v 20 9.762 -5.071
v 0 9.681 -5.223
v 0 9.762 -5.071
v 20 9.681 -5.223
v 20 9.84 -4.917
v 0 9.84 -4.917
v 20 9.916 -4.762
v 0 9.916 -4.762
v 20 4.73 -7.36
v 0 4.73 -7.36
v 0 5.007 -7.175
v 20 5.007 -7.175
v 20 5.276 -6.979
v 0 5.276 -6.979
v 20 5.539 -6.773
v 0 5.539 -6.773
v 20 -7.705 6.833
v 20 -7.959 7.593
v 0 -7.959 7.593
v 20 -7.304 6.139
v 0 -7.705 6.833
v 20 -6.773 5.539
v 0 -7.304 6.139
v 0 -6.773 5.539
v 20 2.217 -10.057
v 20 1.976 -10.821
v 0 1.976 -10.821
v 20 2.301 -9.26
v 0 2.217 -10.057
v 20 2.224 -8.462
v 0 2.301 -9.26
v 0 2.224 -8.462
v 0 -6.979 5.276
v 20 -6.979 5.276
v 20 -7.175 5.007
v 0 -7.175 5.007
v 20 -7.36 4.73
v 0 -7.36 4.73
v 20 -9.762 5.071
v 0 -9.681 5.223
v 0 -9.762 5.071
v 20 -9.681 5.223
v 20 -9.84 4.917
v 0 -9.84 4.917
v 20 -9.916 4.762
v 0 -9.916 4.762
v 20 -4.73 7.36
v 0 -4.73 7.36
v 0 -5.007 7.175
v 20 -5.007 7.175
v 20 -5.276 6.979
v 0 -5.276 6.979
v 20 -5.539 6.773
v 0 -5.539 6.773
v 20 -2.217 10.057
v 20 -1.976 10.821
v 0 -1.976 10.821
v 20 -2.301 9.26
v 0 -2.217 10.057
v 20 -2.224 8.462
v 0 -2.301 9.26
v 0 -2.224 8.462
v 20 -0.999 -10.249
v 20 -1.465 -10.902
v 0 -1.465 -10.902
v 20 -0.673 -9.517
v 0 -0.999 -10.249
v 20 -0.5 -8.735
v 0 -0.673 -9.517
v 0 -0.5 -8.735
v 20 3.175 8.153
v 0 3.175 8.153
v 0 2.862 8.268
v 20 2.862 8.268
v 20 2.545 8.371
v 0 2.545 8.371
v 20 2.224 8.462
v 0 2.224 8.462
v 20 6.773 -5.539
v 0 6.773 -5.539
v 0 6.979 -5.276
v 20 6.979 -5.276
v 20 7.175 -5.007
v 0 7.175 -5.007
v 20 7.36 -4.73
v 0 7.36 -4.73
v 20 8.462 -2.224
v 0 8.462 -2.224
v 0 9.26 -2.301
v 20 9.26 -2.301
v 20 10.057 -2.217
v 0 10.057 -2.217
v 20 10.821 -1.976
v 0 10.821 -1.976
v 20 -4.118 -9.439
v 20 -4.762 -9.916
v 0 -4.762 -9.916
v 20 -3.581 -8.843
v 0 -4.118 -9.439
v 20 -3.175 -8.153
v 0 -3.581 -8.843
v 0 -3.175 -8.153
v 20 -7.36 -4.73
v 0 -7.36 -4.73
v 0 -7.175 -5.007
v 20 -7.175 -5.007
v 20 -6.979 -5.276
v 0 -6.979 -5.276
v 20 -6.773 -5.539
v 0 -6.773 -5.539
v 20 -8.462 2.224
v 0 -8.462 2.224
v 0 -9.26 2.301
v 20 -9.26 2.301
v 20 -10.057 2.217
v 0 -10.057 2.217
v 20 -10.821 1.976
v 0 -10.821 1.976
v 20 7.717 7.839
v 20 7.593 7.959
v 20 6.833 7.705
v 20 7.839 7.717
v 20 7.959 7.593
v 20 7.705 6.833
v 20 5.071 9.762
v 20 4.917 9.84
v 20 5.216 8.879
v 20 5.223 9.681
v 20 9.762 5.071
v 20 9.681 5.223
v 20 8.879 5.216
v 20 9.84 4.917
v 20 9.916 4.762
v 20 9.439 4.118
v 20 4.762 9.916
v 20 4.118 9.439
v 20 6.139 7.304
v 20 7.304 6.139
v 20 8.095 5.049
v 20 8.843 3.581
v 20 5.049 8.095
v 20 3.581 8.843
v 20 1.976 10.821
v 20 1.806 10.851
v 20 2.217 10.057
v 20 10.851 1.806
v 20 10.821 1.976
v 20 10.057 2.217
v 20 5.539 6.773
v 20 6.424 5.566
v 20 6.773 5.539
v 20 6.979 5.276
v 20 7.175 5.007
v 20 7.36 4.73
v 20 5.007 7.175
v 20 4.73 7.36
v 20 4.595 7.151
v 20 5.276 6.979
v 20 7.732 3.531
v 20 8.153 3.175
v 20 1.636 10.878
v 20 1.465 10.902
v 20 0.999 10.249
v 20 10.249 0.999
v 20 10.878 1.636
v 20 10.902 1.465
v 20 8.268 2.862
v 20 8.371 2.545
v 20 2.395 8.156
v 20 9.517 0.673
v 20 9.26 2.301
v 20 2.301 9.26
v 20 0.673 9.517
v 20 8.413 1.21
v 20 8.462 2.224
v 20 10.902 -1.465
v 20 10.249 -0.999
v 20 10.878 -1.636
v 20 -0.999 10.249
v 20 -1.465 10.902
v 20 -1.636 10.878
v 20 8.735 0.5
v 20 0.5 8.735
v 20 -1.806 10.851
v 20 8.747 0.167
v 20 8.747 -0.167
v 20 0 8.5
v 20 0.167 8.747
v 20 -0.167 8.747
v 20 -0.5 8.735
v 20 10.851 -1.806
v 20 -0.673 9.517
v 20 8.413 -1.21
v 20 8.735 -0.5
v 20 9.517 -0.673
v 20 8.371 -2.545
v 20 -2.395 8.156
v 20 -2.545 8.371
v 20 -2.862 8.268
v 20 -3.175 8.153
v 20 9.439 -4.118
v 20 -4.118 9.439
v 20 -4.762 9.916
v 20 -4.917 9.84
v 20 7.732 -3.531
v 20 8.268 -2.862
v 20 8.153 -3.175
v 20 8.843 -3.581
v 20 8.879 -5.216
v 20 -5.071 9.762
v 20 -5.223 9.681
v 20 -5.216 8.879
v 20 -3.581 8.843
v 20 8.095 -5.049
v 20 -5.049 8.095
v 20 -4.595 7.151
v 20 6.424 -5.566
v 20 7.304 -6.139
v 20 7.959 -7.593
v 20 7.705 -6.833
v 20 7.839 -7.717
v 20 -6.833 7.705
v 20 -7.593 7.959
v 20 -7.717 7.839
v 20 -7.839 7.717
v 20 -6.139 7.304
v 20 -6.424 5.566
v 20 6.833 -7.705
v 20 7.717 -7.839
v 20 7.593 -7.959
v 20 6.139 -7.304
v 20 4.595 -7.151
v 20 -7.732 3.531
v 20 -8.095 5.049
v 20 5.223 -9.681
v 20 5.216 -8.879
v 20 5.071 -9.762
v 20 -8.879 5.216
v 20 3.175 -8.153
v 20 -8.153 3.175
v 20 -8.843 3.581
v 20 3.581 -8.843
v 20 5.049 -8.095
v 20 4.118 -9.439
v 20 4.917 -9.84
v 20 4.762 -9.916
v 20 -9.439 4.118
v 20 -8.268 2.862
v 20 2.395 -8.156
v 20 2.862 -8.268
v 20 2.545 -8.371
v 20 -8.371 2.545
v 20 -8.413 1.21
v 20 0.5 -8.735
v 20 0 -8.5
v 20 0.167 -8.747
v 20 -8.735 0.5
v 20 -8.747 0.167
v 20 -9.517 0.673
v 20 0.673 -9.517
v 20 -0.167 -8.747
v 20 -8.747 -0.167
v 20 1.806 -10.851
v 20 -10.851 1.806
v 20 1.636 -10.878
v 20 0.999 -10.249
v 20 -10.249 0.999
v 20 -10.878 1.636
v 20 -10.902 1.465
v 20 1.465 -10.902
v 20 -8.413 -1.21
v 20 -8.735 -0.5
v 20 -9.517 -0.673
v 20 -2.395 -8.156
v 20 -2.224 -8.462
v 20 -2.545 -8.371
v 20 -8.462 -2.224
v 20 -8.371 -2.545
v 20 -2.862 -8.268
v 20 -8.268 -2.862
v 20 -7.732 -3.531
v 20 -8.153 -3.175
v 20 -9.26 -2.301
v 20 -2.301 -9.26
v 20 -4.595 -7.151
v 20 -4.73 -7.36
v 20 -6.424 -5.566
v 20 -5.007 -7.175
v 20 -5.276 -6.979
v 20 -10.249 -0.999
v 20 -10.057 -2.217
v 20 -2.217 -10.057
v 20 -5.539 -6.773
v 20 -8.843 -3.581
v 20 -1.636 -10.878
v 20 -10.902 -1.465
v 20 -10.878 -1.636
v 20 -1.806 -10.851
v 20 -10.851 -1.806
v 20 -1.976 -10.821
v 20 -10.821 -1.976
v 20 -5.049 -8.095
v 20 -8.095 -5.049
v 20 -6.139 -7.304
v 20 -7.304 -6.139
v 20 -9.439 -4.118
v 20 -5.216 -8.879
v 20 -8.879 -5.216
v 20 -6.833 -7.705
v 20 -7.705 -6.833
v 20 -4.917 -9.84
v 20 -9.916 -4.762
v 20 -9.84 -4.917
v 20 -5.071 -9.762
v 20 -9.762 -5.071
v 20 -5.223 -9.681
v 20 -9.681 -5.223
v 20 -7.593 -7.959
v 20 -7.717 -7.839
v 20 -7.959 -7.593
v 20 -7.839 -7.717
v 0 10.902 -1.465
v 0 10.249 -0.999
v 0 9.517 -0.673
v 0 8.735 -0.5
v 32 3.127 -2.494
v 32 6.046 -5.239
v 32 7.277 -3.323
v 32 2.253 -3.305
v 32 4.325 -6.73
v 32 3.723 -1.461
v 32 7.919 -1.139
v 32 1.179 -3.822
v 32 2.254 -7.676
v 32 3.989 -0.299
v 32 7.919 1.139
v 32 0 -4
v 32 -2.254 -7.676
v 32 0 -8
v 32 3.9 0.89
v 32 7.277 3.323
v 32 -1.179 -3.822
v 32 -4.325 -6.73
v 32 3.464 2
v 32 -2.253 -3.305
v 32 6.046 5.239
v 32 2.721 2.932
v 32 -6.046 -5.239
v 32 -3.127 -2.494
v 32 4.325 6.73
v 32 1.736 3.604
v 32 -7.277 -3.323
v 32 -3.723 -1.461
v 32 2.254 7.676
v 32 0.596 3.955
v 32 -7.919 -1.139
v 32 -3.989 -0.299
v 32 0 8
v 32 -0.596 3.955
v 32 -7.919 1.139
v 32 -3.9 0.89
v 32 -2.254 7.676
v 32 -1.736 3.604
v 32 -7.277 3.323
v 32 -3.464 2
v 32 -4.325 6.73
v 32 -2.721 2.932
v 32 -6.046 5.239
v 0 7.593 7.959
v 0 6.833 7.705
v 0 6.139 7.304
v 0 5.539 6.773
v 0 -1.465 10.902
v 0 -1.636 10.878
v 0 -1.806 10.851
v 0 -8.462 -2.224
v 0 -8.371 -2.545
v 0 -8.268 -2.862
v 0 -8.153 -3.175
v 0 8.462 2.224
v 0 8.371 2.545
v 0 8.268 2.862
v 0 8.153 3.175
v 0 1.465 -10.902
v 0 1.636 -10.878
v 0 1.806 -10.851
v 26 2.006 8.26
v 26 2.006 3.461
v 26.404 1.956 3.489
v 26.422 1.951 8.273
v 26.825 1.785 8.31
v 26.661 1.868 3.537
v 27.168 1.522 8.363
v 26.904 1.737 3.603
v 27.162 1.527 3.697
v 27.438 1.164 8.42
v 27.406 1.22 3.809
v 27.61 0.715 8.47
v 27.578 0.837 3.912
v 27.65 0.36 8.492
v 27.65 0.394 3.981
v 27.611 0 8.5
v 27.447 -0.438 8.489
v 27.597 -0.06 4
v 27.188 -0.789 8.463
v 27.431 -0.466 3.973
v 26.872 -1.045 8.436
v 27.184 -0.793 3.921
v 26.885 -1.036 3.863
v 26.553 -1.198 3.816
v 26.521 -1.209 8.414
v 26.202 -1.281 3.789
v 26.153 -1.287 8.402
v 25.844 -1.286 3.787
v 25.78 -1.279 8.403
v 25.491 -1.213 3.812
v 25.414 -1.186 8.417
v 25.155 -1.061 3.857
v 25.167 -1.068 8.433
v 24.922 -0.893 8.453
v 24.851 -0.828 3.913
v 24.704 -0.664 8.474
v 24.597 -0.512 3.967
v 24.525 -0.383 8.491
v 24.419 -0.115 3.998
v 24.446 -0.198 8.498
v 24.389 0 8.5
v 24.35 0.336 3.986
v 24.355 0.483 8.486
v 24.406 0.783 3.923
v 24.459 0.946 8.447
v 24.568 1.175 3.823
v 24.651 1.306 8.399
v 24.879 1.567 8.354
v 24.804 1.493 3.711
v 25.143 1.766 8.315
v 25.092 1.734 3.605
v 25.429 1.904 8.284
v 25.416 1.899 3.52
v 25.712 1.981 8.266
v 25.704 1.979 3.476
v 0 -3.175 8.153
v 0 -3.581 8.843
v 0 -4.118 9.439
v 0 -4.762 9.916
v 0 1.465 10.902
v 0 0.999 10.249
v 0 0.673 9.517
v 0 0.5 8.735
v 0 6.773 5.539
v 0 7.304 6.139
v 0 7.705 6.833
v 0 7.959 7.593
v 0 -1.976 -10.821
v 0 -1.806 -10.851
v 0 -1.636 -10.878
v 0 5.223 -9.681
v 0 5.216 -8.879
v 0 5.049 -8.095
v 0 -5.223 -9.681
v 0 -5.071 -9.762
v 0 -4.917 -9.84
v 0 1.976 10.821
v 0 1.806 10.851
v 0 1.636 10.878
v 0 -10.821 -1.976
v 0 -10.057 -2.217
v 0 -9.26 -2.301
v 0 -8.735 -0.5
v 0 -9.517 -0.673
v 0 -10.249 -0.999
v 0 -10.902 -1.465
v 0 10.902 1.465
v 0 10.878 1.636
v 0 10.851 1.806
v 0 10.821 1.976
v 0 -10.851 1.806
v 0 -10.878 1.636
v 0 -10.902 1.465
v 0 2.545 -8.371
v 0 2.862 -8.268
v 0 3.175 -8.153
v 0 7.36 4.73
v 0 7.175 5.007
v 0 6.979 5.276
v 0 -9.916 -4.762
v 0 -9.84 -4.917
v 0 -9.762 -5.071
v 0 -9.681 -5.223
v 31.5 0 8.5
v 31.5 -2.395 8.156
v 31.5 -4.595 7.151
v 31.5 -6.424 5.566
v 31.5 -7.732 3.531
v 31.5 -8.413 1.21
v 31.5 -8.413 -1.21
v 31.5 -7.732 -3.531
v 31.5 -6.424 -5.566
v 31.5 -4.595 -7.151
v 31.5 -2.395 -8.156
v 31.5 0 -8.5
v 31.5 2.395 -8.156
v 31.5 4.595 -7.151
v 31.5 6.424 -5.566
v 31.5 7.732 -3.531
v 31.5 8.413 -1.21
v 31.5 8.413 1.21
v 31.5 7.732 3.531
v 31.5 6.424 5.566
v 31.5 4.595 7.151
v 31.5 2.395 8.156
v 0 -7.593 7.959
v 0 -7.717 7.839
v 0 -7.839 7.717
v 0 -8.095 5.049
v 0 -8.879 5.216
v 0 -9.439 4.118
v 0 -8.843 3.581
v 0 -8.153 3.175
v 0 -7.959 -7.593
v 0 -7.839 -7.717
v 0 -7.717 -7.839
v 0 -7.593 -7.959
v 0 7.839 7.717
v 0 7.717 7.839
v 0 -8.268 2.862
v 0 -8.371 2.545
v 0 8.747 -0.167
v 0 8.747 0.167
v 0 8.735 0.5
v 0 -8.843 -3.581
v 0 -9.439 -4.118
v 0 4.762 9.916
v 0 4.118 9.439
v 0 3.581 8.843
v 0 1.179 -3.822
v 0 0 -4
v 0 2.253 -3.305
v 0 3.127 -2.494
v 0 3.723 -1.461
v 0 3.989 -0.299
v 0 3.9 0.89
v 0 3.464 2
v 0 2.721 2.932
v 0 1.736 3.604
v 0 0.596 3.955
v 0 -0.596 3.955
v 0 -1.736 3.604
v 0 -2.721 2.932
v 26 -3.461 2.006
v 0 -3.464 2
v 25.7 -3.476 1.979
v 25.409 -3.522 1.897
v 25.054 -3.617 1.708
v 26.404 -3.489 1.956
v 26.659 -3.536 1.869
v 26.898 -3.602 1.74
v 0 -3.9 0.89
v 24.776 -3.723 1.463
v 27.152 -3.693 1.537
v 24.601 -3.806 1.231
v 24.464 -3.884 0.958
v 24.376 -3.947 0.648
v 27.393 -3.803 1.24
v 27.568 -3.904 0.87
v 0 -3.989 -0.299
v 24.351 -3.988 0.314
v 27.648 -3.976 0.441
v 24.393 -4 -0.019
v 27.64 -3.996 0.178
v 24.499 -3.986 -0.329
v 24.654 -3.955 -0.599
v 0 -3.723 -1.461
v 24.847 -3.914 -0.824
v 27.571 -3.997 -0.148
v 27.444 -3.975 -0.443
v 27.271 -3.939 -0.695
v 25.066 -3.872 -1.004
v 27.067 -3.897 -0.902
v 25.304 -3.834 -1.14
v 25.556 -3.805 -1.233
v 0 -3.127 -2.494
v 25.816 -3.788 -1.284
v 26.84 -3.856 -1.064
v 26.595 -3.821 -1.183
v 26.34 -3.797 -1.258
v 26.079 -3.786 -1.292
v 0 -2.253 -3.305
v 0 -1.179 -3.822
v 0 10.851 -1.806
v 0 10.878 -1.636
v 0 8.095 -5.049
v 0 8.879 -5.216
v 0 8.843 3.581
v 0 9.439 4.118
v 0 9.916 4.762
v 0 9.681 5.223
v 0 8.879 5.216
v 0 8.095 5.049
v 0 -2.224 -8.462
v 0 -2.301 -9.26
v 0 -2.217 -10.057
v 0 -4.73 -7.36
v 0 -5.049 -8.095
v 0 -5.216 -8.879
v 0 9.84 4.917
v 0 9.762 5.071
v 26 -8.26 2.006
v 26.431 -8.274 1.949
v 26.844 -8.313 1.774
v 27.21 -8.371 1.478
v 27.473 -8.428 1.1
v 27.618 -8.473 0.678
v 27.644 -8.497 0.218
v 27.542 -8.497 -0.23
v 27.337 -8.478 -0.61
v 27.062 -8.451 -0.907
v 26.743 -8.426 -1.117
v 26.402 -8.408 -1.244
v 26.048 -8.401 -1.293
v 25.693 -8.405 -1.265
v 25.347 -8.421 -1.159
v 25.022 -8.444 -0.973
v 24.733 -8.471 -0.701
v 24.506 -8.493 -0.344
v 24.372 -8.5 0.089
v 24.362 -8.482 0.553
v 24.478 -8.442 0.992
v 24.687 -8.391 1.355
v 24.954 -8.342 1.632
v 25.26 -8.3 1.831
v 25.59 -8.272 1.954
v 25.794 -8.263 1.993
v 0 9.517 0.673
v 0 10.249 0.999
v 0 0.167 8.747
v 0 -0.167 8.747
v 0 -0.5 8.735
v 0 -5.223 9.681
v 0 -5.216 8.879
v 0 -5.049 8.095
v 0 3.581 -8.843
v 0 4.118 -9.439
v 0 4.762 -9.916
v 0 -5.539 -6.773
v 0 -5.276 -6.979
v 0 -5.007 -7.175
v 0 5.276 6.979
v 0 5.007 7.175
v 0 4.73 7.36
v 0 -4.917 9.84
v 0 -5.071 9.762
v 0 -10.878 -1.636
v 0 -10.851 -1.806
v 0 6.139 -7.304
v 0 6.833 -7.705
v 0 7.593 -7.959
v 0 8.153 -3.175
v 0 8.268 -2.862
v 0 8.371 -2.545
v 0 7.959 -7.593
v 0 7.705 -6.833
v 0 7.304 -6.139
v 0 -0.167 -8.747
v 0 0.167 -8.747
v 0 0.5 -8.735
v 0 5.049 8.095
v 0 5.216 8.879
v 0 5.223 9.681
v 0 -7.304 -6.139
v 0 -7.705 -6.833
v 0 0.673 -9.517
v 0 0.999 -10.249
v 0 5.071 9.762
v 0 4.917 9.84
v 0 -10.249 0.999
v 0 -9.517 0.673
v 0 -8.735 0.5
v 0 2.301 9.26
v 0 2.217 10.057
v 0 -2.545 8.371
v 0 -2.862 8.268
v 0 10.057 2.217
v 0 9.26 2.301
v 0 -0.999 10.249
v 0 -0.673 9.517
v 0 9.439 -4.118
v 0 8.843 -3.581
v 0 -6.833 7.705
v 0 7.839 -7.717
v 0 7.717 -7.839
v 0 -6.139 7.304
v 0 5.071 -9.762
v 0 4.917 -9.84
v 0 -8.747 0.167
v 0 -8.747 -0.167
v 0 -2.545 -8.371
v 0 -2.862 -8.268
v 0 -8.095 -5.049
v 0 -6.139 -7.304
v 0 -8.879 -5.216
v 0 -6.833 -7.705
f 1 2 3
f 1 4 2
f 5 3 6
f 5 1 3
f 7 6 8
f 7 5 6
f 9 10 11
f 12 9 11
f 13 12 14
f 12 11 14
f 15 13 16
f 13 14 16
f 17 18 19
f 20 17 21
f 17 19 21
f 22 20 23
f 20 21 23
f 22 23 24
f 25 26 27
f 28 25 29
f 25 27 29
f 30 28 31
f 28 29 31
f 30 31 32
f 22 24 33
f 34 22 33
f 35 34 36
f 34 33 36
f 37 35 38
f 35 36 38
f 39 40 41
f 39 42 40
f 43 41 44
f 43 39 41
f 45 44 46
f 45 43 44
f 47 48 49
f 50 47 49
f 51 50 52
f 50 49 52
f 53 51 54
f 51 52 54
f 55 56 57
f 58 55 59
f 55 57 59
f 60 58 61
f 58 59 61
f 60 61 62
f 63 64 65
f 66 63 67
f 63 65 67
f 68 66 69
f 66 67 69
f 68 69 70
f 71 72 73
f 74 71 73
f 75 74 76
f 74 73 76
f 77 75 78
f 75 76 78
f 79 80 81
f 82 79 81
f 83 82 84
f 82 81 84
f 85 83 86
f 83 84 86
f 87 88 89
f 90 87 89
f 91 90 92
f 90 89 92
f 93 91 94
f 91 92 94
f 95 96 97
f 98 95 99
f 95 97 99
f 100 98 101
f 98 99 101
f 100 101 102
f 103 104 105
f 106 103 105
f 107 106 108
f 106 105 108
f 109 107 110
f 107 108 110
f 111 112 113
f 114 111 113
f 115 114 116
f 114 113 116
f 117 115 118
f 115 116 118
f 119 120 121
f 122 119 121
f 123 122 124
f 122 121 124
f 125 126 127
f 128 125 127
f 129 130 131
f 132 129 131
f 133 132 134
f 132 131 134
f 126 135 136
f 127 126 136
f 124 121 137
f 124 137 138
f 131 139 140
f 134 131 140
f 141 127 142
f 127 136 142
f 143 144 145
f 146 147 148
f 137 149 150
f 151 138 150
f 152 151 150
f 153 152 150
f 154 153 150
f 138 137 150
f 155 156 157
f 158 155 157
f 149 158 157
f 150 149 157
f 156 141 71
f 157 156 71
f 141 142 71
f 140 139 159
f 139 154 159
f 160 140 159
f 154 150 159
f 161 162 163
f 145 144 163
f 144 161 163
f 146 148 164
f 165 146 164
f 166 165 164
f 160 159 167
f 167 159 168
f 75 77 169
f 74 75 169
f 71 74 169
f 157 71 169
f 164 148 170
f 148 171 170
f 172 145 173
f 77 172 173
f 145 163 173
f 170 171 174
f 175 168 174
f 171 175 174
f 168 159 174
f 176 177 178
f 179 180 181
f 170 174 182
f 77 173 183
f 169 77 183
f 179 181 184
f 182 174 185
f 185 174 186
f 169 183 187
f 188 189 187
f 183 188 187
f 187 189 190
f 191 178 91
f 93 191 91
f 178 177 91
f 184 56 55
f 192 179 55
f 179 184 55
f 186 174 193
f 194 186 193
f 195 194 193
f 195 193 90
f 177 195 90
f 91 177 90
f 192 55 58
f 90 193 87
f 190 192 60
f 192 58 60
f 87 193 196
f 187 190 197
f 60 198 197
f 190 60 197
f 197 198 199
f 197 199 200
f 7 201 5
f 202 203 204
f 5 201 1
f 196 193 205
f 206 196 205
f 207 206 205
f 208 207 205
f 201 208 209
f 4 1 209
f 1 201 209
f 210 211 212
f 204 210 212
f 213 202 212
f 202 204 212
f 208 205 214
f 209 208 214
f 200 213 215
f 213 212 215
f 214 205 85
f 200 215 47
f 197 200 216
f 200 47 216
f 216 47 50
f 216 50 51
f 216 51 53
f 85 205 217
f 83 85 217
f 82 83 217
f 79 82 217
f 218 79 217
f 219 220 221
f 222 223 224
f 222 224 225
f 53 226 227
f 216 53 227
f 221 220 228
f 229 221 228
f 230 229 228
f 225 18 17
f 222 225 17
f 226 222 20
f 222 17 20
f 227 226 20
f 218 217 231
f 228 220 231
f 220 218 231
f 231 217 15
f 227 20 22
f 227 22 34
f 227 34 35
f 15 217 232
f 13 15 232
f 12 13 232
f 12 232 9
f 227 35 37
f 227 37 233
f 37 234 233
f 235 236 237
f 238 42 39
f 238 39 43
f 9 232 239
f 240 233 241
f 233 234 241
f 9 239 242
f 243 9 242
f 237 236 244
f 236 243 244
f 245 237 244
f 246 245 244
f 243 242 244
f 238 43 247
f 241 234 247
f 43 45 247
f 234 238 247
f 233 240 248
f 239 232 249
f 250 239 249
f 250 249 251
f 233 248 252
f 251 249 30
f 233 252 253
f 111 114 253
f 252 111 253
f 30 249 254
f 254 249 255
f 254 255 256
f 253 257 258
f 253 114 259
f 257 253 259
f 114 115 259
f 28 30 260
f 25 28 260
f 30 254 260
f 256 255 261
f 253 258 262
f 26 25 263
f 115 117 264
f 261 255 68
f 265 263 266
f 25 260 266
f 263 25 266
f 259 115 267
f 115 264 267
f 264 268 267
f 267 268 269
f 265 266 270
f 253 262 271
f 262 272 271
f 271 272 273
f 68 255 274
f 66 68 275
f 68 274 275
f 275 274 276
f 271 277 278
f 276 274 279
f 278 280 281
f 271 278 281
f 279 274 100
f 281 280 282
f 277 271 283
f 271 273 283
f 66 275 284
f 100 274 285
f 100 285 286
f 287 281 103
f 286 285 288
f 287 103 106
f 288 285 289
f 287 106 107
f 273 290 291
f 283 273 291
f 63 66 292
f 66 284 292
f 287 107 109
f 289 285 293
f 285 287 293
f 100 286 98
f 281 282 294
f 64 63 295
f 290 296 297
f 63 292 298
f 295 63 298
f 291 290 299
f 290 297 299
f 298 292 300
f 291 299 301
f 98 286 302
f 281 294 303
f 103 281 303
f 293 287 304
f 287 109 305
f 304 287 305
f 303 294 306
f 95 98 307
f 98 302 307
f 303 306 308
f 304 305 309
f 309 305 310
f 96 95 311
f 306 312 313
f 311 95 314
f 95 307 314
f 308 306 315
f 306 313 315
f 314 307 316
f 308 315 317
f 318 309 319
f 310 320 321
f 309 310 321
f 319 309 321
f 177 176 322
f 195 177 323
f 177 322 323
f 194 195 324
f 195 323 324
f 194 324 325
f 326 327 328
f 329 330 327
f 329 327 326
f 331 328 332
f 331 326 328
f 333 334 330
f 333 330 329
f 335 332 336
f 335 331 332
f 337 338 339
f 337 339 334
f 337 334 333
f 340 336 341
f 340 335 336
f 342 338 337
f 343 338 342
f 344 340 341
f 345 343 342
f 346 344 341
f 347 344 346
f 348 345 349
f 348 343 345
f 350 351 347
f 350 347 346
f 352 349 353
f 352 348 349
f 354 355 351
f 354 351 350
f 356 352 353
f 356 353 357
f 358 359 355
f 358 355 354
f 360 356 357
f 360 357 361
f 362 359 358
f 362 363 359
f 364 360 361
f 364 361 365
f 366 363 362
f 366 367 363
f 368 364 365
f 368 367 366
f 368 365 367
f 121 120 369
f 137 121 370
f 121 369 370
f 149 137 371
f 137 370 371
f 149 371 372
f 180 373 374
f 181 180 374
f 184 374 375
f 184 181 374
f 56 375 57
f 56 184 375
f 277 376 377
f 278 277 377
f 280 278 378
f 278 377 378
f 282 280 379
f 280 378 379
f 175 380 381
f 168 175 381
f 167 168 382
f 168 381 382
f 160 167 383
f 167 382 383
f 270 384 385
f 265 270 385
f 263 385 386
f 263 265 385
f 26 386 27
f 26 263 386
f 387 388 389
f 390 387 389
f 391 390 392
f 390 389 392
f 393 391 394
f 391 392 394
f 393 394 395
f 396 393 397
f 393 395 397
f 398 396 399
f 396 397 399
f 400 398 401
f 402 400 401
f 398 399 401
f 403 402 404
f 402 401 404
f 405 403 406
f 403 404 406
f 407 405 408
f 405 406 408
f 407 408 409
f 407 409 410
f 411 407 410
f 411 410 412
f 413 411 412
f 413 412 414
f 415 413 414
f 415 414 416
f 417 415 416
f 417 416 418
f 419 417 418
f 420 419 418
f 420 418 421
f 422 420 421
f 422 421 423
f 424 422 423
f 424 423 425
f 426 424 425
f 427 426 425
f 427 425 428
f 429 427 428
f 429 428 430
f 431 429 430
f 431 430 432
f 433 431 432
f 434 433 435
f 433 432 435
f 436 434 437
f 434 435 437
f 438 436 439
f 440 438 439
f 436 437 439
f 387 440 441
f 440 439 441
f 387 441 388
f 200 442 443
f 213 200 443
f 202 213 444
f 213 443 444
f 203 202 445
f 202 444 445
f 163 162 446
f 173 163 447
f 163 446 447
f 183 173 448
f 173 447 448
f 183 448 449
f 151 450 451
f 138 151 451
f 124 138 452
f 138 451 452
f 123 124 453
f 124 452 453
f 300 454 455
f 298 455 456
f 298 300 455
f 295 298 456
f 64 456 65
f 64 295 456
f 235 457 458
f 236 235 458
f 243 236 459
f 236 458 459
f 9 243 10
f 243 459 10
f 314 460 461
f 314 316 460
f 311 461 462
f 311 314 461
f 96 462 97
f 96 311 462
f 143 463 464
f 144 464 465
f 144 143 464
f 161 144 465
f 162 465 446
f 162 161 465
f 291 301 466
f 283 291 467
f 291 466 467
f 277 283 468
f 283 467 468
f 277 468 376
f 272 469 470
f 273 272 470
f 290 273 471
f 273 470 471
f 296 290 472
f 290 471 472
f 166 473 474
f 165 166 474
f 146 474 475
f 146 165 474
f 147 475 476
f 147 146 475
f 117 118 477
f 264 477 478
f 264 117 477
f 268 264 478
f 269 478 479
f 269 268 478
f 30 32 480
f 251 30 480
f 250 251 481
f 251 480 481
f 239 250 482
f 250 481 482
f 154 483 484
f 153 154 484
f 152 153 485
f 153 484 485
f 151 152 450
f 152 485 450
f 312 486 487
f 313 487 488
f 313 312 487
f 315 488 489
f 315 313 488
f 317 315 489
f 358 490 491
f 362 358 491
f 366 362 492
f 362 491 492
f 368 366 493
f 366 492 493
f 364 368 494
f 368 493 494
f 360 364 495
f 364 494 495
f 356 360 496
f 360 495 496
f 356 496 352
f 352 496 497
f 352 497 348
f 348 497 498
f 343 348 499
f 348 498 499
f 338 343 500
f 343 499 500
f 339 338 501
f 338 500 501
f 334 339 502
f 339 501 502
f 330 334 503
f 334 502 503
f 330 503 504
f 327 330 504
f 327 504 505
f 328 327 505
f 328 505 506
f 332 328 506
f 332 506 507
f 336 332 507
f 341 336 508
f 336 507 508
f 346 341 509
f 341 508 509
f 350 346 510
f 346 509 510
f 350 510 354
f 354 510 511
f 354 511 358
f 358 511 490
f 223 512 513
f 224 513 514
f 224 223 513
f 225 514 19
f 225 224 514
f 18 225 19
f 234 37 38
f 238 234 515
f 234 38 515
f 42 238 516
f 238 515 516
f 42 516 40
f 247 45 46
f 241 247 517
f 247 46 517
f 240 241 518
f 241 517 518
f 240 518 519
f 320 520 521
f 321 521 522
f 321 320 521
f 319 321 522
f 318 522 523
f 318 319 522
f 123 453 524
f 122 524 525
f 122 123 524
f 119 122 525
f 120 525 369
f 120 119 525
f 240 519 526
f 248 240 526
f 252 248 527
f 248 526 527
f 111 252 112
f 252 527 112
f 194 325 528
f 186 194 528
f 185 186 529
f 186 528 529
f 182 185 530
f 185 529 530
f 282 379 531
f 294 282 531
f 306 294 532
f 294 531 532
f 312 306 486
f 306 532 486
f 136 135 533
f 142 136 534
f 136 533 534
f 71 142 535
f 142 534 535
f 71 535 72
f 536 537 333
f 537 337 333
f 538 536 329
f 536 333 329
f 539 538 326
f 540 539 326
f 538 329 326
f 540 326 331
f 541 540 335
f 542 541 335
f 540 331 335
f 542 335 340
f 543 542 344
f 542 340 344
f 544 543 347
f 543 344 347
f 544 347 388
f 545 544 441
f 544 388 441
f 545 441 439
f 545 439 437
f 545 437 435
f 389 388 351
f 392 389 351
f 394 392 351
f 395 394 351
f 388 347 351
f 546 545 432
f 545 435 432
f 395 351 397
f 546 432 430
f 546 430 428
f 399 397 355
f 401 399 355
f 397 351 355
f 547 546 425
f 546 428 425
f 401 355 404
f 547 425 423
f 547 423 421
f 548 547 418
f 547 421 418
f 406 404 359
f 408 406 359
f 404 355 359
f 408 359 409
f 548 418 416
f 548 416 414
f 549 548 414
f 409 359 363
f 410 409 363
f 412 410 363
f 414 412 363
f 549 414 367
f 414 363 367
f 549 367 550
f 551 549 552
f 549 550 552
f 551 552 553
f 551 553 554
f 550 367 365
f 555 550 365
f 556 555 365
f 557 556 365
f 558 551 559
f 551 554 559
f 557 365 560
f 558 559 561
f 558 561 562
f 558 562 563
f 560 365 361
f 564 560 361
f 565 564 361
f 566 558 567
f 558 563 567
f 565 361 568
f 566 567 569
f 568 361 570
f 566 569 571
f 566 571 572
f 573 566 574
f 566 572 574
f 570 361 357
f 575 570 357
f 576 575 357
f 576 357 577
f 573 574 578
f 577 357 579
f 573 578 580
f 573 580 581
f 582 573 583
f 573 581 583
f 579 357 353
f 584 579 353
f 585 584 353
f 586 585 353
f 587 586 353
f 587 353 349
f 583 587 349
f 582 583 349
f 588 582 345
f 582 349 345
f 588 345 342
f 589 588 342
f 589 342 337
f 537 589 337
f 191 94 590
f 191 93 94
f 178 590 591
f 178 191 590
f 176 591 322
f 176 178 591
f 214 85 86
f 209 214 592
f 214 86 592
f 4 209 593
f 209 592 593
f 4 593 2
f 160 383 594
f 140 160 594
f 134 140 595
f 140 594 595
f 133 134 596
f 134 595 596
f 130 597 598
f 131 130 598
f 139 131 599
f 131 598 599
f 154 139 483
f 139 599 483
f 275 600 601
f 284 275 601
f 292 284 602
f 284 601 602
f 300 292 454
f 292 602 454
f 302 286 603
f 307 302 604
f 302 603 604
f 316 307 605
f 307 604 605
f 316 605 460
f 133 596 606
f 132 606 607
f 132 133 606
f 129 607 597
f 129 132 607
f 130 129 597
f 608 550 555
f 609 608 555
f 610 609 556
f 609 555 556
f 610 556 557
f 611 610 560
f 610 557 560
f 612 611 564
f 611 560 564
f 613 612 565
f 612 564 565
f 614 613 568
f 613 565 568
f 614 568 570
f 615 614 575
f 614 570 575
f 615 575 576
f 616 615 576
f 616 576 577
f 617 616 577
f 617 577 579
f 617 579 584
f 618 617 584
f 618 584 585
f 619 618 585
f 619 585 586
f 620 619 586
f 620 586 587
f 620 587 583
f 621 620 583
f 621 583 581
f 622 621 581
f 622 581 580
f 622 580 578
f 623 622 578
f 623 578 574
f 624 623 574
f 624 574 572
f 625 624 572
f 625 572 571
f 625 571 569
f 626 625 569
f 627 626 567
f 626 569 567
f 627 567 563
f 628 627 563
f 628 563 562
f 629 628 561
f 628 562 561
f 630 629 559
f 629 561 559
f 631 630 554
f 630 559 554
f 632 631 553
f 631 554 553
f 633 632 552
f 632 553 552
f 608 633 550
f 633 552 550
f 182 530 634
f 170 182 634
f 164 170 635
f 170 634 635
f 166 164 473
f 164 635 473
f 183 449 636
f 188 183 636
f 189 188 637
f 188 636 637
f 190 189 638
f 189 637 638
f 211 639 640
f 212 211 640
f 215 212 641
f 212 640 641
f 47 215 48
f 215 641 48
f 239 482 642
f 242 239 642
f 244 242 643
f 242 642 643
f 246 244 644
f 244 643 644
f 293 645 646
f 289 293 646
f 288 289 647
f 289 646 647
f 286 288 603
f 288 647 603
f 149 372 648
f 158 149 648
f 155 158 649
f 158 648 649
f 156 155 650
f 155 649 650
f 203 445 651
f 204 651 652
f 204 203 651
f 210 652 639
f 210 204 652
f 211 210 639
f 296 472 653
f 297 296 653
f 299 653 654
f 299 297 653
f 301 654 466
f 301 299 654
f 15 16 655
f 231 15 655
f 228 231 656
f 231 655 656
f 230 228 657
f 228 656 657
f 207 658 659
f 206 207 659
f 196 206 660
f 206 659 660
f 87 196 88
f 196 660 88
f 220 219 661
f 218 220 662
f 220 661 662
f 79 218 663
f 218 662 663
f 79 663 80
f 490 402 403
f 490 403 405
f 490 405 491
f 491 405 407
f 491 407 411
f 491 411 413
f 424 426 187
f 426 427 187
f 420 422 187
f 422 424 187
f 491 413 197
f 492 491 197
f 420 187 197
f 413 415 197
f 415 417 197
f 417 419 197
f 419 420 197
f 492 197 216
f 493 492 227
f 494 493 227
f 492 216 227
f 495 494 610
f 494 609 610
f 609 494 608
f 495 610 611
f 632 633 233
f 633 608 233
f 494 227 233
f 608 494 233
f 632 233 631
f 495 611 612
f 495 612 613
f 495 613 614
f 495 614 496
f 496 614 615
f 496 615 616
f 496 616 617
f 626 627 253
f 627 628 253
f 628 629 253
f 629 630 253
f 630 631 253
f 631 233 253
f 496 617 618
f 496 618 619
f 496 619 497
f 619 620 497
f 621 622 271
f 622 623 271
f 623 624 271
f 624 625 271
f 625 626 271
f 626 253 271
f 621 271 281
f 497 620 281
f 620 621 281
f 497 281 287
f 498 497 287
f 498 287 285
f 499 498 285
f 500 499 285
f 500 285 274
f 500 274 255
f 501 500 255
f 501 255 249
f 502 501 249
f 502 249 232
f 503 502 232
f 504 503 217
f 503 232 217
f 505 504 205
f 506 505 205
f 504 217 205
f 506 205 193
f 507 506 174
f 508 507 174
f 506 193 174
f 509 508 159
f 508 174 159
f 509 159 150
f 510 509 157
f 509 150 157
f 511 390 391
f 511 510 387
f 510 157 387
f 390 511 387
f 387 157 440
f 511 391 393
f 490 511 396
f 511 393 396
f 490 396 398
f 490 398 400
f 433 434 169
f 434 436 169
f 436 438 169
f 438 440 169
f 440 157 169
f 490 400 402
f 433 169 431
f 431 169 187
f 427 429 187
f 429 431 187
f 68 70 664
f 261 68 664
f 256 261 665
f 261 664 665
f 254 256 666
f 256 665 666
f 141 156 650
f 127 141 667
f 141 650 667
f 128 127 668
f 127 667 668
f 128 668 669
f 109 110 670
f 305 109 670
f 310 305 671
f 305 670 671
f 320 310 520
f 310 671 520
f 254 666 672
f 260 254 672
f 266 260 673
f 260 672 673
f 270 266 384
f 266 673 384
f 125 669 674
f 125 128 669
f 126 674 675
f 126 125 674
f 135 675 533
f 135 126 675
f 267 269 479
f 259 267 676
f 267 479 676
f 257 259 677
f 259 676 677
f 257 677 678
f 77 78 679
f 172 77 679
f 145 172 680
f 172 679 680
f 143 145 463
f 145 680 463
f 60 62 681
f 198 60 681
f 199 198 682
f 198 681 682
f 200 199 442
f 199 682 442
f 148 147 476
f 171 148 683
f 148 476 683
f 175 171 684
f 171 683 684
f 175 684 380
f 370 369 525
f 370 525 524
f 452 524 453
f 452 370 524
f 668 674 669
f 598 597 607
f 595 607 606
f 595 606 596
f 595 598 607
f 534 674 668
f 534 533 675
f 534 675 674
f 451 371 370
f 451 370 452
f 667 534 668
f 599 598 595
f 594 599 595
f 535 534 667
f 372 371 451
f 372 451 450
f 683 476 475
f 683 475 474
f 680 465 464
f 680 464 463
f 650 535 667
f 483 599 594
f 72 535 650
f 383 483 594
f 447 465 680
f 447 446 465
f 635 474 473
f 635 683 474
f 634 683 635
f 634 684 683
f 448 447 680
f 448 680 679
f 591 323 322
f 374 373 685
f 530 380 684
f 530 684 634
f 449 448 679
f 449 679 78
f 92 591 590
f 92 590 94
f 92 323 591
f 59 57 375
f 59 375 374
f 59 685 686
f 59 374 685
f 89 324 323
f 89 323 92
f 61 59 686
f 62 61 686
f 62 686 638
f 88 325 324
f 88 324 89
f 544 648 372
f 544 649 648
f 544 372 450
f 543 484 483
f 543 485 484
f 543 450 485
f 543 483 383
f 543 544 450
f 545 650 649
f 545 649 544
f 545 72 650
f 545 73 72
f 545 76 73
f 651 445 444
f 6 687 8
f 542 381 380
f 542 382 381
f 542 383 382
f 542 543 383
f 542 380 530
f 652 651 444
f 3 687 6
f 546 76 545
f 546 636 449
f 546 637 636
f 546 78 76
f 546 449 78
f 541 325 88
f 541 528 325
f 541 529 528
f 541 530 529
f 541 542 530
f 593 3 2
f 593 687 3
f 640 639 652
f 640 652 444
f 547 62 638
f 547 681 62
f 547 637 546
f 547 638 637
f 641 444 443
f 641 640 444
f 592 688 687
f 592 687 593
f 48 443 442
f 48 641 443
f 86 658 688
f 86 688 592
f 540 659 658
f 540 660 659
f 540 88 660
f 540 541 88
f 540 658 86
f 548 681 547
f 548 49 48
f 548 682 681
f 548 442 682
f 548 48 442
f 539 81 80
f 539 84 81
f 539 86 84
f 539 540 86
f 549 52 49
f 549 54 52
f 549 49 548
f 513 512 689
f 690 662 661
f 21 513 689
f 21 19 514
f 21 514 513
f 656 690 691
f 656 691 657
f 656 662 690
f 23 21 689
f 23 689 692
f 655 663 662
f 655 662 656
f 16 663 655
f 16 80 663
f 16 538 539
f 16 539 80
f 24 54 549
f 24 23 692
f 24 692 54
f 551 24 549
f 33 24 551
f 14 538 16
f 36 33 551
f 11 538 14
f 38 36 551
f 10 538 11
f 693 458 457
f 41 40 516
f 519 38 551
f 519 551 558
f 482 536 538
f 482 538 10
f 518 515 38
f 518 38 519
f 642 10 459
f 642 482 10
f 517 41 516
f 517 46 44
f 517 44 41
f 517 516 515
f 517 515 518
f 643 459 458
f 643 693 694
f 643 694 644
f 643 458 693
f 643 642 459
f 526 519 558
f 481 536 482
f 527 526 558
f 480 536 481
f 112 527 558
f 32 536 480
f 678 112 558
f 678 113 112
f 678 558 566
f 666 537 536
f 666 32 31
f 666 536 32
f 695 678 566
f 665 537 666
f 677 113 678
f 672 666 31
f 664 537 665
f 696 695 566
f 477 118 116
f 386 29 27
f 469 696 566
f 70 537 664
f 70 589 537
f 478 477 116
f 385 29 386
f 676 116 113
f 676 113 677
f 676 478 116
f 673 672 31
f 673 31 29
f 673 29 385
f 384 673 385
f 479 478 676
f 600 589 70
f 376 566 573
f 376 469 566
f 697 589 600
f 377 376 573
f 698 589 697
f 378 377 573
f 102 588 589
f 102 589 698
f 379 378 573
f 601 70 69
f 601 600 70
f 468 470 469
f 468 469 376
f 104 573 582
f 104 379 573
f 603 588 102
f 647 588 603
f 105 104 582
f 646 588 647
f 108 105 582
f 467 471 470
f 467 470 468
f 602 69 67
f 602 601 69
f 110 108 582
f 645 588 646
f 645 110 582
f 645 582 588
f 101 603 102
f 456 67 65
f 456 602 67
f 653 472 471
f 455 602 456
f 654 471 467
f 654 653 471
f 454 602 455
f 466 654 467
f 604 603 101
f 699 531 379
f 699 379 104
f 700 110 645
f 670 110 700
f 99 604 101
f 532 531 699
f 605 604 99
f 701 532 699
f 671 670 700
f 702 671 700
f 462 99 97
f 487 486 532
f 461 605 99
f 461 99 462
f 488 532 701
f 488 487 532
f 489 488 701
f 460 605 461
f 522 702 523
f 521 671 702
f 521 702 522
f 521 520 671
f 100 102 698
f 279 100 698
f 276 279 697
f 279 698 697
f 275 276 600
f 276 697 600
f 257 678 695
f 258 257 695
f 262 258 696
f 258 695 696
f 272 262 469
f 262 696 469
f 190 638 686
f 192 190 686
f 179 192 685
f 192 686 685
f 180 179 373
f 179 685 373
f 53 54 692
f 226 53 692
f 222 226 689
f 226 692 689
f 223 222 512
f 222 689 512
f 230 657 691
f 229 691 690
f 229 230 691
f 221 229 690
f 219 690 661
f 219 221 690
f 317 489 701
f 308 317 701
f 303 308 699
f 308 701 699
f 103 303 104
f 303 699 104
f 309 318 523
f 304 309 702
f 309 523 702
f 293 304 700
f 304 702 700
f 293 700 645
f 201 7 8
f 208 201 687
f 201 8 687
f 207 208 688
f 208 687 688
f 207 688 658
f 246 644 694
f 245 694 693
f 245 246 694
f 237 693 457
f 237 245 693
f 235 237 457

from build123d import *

# Parameters (mm, degrees)
BASPROSKE_W              = 20
BASPROSKE_H              = 11
TOOTHCUT_DEPTH           = 26.337718919
TEETHCUTS_COUNT          = 20
TEETHCUTS_ANGLE          = 342
SKETCH_2_R               = 8.5
EXTRUDE_1_DEPTH          = 12
BORSKE_R                 = 4
BORE_DEPTH               = 50.0000508
CHAMFER_1_SIZE           = 0.5
SKETCH_3_R               = 1.65
CUT_EXTRUDE_1_DEPTH      = 10
PATTERN_CIRCULAR_1_COUNT = 2
PATTERN_CIRCULAR_1_ANGLE = 90


with BuildPart() as part:
    # BasProSke → Base-Revolve (revolve)
    with BuildSketch(Plane(origin=(0, 0, 0), x_dir=(1, 0, 0), z_dir=(0, 1, 0)), mode=Mode.PRIVATE) as base_revolve_sk:
        with Locations((10, 5.5)):
            Rectangle(BASPROSKE_W, BASPROSKE_H)
    revolve(base_revolve_sk.sketch.rotate(Axis((-10, 0, 0), (1, 0, 0)), 180), axis=Axis((-10, 0, 0), (1, 0, 0)))

    # TooCutSke → ToothCut (cut, through all)
    with BuildSketch(Plane(origin=(0, 0, 0), x_dir=(0, 0, -1), z_dir=(1, 0, 0))):
        with BuildLine():
            ThreePointArc((0.499924007, 8.734705318), (0, 8.749), (-0.499924007, 8.734705318))
            ThreePointArc((-0.499924007, 8.734705318), (-0.824302243, 9.905497836), (-1.485192705, 10.924909509))
            ThreePointArc((-1.485192705, 10.924909509), (0, 11.0254), (1.485192705, 10.924909509))
            ThreePointArc((1.485192705, 10.924909509), (0.824302243, 9.905497836), (0.499924007, 8.734705318))
        make_face()
    toothcut = extrude(amount=TOOTHCUT_DEPTH, mode=Mode.SUBTRACT)

    # TeethCuts: ToothCut ×20 about axis
    teethcuts_axis = Axis((-10, 0, 0), (1, 0, 0))
    for i in range(1, TEETHCUTS_COUNT):
        add(toothcut.rotate(teethcuts_axis, i * TEETHCUTS_ANGLE / (TEETHCUTS_COUNT - 1)), mode=Mode.SUBTRACT)

    # 草圖2 → 填料-伸長1 (add)
    with BuildSketch(Plane(origin=(20, 0, 0), x_dir=(0, 0, -1), z_dir=(1, 0, 0))):
        with Locations(Location((0, 0, 0), (0, 0, 180))):
            Circle(SKETCH_2_R)
    extrude(amount=EXTRUDE_1_DEPTH)

    # BorSke → Bore (cut, symmetric)
    with BuildSketch(Plane(origin=(0, 0, 0), x_dir=(0, 0, -1), z_dir=(1, 0, 0))):
        Circle(BORSKE_R)
    extrude(amount=BORE_DEPTH, both=True, mode=Mode.SUBTRACT)

    # 導角1
    chamfer_1_edges = [part.edges().sort_by_distance(p)[0] for p in [
        (32, 0, -8.5),
    ]]
    chamfer(chamfer_1_edges, length=CHAMFER_1_SIZE)

    # 草圖3 → 除料-伸長1 (cut)
    with BuildSketch(Plane(origin=(0, 0, 0), x_dir=(1, 0, 0), z_dir=(0, 1, 0))):
        with Locations(Location((26, -0.356131442, 0), (0, 0, 270))):
            Circle(SKETCH_3_R)
    cut_extrude_1 = extrude(amount=-CUT_EXTRUDE_1_DEPTH, mode=Mode.SUBTRACT)

    # 環狀複製排列1: 除料-伸長1 ×2 about axis
    pattern_circular_1_axis = Axis((32, 0, 0), (-1, 0, 0))
    for i in range(1, PATTERN_CIRCULAR_1_COUNT):
        add(cut_extrude_1.rotate(pattern_circular_1_axis, i * PATTERN_CIRCULAR_1_ANGLE / (PATTERN_CIRCULAR_1_COUNT - 1)), mode=Mode.SUBTRACT)


solid = part.part
